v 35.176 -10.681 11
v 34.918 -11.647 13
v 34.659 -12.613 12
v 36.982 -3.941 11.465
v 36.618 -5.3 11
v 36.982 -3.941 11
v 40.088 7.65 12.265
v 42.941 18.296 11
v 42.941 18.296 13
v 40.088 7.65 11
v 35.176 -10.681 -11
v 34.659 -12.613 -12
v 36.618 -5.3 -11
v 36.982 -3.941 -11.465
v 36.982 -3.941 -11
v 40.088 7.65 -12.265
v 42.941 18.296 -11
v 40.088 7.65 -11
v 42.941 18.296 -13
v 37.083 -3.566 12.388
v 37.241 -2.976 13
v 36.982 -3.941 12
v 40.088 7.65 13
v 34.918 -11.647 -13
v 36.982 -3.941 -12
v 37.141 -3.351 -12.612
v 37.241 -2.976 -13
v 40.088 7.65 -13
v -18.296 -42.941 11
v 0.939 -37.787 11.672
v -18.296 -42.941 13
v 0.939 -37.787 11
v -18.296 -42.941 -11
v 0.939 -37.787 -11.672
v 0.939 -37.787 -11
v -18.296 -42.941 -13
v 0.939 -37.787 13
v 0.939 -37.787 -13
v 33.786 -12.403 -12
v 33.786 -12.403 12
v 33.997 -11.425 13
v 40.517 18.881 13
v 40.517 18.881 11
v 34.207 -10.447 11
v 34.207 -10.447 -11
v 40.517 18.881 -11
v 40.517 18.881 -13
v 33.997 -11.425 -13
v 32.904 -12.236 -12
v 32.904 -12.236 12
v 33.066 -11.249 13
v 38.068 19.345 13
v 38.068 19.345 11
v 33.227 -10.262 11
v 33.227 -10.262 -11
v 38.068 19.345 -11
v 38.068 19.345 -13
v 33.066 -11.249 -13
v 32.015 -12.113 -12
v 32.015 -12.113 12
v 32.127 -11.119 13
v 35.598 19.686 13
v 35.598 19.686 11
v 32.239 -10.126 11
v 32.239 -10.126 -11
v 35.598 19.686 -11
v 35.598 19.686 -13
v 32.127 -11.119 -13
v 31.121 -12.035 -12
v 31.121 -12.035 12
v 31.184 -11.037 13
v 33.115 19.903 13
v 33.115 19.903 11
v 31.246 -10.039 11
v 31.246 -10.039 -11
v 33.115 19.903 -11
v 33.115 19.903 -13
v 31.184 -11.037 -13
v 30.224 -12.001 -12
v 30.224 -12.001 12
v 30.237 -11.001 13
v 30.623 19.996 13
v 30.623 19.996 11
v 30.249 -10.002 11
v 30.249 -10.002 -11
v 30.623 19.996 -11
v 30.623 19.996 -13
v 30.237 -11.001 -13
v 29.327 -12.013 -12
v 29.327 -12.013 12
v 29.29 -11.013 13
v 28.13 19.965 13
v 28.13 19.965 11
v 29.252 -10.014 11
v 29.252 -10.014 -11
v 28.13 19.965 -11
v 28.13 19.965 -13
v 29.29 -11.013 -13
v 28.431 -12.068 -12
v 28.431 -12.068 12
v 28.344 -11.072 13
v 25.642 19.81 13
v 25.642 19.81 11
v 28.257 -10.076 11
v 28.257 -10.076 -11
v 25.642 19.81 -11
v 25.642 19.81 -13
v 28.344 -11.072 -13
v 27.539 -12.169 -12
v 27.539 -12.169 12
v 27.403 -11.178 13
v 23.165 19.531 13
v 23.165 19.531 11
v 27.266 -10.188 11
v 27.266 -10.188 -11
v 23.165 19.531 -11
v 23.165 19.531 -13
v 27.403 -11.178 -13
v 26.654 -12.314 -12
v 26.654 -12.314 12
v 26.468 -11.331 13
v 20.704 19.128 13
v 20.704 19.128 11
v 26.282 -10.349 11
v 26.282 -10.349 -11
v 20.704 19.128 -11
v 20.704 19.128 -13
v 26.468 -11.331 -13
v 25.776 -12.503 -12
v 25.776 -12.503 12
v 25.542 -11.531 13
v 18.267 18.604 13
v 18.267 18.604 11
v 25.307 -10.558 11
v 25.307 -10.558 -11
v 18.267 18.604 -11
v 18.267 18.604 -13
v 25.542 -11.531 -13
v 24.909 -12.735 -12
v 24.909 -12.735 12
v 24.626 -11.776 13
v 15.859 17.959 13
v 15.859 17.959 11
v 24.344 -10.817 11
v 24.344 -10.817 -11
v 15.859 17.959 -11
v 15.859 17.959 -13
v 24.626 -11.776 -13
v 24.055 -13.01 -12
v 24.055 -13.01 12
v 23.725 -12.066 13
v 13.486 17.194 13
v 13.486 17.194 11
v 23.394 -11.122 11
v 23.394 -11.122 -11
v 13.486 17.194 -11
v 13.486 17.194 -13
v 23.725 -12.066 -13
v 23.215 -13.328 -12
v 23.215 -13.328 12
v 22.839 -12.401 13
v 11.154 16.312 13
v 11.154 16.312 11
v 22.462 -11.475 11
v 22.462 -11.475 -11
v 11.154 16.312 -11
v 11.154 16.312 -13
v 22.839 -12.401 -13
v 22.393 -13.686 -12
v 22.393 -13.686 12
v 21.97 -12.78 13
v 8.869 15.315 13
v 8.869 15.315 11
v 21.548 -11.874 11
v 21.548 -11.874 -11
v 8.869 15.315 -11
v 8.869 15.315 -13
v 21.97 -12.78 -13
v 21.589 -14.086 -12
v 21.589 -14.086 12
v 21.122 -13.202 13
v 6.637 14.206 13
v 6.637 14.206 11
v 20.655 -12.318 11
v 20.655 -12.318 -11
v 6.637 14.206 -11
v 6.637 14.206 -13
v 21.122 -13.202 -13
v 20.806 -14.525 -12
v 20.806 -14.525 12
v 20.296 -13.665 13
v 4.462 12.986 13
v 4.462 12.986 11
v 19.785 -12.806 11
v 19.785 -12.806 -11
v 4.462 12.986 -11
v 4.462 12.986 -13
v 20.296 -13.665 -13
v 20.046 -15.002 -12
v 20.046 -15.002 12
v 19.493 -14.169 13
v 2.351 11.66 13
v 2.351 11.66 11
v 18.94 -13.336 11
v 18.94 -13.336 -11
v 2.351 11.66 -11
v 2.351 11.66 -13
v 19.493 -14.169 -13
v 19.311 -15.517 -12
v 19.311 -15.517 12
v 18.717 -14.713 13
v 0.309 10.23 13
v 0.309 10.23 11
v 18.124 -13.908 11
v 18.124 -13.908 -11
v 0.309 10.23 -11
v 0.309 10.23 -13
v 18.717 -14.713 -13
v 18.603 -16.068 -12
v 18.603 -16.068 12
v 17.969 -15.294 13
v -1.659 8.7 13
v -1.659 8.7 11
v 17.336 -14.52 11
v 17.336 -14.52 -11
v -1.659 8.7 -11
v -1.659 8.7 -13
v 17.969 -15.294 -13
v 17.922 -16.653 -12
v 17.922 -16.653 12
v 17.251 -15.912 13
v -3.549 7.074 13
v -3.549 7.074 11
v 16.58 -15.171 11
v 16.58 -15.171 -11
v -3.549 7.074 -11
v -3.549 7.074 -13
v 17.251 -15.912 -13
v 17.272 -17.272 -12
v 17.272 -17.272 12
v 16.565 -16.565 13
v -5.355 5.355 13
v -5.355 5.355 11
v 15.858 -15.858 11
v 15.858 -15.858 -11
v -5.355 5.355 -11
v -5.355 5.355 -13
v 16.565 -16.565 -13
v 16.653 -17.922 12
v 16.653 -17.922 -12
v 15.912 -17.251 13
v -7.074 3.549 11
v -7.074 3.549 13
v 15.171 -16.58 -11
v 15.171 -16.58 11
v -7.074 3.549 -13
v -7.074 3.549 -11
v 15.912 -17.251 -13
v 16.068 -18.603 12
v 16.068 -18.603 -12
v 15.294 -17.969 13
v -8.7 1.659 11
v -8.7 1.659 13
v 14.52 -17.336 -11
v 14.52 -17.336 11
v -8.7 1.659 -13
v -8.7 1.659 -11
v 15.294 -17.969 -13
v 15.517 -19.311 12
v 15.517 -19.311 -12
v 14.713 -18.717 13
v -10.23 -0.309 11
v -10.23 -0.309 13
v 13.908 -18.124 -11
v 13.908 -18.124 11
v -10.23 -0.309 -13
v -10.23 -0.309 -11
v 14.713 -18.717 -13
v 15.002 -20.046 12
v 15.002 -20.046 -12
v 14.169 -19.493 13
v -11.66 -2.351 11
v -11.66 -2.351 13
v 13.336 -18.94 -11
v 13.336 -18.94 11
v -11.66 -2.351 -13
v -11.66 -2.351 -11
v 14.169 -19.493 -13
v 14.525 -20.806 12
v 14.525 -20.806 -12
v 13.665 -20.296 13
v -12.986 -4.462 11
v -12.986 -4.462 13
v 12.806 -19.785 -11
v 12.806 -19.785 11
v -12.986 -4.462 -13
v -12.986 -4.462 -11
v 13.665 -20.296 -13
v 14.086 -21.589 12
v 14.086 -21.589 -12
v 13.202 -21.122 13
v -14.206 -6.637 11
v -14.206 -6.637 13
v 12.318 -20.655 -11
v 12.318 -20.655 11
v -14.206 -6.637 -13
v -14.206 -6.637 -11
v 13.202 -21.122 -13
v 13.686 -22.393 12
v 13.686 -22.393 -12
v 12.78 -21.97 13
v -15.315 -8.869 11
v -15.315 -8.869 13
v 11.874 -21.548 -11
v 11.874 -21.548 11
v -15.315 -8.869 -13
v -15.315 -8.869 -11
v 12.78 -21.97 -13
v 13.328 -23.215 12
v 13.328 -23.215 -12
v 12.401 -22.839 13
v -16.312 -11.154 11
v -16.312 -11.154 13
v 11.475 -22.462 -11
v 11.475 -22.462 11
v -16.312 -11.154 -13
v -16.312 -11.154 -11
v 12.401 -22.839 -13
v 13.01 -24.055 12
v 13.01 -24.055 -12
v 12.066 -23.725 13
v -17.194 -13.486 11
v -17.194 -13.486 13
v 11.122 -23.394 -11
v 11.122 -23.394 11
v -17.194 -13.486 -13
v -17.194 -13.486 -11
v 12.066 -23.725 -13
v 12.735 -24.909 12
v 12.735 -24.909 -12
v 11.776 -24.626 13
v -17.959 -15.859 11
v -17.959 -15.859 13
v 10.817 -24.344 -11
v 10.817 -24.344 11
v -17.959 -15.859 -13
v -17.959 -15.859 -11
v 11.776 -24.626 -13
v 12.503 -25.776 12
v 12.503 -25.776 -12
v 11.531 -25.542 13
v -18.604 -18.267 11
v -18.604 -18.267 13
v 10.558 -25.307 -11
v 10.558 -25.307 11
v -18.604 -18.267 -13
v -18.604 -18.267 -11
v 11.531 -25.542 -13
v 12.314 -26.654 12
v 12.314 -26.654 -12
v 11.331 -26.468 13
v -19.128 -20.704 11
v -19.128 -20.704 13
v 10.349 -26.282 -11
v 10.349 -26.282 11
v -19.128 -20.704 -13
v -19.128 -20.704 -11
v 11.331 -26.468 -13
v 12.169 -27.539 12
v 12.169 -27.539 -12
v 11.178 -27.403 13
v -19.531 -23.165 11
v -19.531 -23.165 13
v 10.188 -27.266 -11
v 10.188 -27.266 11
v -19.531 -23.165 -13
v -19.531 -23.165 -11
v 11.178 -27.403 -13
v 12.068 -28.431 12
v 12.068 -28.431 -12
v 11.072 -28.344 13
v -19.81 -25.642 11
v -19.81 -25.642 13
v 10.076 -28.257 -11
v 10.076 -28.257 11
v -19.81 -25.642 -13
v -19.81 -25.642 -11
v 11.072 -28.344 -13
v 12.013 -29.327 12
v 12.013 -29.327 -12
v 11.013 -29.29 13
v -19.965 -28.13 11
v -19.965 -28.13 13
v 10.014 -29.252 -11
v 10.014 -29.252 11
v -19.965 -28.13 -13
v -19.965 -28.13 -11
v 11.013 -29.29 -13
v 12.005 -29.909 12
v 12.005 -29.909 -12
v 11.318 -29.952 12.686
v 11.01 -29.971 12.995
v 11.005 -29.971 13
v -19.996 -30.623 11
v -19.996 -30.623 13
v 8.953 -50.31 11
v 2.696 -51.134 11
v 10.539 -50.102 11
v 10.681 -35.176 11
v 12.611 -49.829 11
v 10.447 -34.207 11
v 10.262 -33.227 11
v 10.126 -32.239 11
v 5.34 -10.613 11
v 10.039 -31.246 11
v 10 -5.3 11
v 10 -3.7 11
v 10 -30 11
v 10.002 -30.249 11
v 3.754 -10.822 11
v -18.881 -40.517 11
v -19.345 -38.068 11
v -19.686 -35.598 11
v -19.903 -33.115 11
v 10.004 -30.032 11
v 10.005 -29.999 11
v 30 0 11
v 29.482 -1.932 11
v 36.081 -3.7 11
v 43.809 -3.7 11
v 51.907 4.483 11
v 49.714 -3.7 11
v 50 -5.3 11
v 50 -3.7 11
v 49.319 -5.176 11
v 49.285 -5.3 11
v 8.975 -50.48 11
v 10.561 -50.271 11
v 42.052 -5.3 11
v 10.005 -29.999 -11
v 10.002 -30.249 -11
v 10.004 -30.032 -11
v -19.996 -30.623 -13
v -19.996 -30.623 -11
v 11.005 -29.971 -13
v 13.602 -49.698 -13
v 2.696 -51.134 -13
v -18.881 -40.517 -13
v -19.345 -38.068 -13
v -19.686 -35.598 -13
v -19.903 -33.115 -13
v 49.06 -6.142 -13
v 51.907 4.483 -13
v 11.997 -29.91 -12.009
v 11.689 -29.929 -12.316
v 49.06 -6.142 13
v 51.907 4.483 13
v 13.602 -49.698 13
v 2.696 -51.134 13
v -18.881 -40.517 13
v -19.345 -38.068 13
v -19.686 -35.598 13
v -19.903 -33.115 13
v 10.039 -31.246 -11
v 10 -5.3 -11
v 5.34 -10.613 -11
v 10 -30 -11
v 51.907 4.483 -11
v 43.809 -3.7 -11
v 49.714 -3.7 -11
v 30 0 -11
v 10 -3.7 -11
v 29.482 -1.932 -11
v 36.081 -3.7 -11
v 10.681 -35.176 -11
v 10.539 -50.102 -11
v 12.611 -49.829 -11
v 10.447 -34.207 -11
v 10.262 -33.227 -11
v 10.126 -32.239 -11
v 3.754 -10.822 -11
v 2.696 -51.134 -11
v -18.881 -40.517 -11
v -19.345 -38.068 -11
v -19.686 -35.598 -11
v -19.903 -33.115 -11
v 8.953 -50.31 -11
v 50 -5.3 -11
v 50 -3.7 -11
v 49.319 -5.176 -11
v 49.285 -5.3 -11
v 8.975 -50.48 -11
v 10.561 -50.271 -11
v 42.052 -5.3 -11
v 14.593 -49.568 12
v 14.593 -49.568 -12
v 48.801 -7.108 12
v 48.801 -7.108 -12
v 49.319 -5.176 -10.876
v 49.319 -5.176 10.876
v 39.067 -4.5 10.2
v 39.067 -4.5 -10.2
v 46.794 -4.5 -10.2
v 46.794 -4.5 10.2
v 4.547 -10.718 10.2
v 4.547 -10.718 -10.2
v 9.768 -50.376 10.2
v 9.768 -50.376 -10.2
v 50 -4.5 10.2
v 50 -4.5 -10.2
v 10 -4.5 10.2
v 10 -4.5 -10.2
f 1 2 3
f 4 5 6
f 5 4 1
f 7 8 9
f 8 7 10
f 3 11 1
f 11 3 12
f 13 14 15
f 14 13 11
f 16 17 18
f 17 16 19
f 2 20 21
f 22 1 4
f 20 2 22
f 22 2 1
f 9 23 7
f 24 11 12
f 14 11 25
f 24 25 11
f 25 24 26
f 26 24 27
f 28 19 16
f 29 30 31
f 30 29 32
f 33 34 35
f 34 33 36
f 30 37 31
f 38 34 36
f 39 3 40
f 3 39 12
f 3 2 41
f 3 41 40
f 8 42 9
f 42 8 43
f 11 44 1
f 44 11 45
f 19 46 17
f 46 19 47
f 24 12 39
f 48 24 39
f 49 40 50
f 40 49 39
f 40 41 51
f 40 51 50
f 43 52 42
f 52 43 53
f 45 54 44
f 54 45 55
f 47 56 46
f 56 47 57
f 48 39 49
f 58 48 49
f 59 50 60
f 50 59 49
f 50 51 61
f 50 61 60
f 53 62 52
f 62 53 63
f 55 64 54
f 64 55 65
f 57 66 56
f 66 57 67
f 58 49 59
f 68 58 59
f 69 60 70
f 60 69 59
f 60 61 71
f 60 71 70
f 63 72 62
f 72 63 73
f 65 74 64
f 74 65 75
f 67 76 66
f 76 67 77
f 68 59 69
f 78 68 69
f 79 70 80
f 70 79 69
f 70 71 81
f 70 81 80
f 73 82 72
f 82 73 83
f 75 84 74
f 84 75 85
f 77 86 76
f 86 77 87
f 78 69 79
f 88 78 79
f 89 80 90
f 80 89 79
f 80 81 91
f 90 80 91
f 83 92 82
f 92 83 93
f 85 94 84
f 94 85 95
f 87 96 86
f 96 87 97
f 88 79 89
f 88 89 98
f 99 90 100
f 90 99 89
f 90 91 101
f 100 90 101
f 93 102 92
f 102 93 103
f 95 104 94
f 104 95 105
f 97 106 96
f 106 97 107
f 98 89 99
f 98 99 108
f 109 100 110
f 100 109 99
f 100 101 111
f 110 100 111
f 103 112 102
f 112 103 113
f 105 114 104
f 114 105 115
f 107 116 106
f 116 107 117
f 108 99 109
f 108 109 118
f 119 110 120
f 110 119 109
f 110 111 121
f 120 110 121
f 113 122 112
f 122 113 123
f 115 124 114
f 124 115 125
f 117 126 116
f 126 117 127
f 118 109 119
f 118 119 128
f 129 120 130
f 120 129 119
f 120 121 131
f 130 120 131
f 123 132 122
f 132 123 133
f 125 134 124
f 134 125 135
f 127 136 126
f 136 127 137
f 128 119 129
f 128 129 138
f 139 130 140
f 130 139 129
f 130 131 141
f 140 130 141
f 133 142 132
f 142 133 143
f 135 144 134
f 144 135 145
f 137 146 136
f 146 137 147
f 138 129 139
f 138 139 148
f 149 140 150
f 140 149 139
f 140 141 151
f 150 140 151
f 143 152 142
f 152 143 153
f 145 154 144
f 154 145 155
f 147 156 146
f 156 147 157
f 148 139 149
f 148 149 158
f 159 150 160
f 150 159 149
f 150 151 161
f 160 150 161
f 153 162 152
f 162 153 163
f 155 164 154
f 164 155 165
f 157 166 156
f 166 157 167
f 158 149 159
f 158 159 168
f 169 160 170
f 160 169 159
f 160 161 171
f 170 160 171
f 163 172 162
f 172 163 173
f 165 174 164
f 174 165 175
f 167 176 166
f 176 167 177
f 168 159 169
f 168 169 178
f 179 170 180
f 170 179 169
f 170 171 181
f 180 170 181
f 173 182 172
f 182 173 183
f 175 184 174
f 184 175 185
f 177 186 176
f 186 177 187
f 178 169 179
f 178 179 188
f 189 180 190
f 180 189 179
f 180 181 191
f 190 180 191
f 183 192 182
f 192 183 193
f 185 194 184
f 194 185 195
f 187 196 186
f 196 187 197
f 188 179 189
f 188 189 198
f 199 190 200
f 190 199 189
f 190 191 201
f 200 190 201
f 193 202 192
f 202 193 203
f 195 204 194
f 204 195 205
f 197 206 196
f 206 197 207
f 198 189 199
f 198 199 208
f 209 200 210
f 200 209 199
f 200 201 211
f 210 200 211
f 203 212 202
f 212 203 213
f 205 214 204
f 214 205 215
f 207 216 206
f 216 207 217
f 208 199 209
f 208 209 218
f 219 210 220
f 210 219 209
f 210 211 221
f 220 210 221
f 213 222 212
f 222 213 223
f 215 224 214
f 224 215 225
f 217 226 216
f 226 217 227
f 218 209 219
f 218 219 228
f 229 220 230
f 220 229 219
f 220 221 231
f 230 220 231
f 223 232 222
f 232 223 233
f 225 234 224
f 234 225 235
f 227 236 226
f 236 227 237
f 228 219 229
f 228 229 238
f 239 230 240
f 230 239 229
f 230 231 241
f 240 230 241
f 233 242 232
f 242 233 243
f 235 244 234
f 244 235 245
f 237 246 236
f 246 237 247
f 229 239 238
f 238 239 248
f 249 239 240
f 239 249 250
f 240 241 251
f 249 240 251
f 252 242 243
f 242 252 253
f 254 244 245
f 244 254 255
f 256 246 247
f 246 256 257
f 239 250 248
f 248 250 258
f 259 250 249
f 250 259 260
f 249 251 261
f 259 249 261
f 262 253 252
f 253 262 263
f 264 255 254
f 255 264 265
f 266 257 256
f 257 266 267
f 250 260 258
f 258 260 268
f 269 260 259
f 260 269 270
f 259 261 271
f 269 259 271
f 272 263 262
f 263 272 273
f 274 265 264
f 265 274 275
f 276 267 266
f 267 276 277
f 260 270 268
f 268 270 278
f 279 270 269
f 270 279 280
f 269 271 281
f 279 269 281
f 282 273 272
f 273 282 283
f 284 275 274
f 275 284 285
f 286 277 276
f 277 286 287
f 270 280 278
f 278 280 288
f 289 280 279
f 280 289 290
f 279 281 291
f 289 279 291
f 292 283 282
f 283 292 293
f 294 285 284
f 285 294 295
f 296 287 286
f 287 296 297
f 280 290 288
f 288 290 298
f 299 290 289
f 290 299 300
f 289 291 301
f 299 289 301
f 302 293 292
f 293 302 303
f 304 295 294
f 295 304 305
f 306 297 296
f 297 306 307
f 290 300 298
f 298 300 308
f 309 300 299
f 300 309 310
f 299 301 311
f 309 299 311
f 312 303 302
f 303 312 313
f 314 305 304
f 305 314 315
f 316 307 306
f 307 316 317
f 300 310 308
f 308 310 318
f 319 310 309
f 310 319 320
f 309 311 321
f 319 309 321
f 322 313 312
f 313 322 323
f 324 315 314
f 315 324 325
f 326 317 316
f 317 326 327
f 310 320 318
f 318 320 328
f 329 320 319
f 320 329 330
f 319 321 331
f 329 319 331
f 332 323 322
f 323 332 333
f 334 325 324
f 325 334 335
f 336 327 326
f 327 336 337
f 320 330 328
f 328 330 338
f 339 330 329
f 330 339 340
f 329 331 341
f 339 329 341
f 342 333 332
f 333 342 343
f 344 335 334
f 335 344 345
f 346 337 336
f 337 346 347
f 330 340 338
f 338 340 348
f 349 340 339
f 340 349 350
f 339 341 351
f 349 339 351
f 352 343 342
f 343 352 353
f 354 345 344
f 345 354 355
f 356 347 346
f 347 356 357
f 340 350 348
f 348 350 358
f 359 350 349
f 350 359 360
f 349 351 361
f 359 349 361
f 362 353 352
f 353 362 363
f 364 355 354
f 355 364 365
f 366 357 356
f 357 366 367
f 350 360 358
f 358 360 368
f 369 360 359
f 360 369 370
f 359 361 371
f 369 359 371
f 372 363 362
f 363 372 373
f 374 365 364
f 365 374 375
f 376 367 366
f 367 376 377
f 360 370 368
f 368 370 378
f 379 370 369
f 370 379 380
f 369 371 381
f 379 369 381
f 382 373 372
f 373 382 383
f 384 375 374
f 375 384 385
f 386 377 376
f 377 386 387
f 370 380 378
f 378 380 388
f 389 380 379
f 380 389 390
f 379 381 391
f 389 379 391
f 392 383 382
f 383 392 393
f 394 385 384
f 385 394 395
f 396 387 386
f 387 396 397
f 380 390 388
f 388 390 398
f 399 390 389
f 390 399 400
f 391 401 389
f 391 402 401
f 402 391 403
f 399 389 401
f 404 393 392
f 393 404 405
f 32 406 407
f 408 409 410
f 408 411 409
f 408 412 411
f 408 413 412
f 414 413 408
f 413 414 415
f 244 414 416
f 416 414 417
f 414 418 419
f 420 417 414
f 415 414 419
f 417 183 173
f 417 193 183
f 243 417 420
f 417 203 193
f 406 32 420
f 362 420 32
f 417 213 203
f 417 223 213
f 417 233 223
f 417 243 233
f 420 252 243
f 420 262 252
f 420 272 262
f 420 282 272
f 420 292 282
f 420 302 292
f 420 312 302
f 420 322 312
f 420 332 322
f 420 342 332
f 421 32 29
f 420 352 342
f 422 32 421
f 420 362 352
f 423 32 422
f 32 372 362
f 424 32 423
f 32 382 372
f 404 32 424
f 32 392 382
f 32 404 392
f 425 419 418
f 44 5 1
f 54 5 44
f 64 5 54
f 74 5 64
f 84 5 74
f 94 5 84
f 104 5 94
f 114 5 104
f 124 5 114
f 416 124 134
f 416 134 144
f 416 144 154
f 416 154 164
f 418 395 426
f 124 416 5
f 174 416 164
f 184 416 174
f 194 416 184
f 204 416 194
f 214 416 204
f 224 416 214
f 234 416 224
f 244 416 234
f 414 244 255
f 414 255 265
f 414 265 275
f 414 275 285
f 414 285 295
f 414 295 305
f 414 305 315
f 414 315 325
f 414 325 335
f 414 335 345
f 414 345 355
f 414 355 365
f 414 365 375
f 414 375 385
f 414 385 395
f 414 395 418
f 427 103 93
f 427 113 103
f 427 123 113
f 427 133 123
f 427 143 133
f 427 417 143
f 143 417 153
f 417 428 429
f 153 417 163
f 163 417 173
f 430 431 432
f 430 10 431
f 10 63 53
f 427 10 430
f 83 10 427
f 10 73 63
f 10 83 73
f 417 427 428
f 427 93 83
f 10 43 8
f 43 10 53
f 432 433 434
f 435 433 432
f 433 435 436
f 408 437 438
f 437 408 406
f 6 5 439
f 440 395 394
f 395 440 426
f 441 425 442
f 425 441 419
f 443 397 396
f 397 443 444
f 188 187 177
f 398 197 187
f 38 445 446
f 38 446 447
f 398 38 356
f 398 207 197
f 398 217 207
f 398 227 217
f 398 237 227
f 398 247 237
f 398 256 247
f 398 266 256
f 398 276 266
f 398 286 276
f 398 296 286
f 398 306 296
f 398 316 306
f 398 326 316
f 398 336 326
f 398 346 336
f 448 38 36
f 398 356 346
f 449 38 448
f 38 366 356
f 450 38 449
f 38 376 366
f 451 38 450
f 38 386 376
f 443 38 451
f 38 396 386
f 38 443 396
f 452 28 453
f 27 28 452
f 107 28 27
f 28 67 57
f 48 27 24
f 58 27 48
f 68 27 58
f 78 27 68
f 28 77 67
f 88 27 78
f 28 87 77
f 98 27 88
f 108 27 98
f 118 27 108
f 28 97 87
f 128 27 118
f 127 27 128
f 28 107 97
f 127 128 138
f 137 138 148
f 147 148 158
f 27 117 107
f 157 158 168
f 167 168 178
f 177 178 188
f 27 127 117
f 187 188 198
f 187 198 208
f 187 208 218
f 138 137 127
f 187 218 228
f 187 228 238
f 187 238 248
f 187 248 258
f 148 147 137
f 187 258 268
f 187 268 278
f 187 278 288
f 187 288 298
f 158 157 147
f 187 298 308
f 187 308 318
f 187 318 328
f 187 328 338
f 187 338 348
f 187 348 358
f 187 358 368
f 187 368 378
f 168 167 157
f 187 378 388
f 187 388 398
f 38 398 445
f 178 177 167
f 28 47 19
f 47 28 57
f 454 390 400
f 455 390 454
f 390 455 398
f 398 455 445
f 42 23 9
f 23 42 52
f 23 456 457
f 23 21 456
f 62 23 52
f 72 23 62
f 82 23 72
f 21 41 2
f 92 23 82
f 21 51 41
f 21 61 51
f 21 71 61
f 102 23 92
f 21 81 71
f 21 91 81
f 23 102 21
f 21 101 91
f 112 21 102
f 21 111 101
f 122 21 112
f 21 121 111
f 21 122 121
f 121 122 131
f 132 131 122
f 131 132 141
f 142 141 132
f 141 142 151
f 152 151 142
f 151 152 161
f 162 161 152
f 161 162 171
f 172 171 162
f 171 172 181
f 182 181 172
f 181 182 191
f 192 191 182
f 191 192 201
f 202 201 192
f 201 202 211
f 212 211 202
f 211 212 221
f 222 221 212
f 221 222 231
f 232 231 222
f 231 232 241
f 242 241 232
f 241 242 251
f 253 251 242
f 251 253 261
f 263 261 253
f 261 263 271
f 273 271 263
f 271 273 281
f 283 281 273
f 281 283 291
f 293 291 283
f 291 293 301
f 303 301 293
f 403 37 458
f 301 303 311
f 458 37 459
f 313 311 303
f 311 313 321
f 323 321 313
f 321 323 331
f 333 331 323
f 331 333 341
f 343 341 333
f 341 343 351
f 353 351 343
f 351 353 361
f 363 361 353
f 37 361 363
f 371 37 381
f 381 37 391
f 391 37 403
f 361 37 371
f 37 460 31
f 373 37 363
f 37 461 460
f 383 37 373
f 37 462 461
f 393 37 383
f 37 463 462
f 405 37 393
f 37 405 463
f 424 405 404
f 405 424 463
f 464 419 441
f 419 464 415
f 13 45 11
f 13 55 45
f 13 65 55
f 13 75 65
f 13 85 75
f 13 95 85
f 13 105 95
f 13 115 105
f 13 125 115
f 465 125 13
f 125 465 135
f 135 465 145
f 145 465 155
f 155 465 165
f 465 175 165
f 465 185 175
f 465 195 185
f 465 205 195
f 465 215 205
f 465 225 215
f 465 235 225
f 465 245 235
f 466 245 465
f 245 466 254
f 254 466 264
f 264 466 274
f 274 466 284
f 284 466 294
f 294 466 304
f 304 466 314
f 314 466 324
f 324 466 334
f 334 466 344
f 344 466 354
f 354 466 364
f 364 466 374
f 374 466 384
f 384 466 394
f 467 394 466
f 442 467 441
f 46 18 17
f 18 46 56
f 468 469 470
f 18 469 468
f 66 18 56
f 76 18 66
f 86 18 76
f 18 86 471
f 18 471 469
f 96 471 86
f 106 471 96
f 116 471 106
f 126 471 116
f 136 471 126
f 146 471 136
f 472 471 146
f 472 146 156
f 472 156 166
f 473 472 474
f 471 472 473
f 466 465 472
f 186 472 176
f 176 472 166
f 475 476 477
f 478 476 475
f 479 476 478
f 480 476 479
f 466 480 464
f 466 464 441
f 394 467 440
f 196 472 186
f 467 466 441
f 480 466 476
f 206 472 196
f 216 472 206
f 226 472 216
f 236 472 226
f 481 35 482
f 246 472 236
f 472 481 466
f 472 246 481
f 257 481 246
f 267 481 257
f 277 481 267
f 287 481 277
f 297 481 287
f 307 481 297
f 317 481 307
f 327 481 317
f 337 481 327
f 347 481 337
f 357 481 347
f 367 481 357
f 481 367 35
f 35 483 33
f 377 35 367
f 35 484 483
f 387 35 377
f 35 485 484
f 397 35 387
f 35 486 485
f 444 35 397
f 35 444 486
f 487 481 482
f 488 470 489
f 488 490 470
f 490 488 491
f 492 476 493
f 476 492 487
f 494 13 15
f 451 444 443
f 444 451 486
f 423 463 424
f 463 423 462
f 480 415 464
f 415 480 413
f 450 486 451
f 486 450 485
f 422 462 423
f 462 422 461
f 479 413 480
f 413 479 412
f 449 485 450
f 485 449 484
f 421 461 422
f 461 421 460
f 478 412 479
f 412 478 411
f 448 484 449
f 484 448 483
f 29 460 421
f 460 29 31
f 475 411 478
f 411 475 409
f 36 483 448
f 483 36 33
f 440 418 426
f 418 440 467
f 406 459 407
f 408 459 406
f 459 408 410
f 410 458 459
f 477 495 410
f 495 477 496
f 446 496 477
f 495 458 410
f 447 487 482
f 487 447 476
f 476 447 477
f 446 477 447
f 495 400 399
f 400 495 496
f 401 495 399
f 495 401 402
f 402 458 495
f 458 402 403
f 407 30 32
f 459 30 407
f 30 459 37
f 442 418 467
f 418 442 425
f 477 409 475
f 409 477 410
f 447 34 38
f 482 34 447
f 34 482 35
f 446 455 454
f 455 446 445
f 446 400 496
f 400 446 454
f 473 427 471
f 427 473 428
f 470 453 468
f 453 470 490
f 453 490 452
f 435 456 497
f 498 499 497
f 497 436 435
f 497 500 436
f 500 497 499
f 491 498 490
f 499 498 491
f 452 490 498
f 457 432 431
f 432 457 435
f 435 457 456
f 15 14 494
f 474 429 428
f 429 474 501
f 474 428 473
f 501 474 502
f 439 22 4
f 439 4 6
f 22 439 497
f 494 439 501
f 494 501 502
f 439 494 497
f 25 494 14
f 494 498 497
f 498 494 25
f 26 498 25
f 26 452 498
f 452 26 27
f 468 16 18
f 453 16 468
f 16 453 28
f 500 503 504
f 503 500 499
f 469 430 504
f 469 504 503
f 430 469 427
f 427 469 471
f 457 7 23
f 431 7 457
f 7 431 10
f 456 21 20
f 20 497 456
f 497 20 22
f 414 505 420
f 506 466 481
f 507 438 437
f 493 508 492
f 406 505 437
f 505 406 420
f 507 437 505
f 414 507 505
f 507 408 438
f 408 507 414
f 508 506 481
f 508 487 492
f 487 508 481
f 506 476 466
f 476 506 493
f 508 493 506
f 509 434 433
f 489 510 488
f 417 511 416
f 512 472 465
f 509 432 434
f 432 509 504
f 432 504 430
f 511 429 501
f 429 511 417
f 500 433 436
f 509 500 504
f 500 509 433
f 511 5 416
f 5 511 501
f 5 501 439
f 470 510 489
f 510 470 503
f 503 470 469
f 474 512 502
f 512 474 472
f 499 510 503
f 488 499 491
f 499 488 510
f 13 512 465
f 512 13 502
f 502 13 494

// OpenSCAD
//###############################################################################
//# CableChannelParts                                                           #
//###############################################################################
//#    Copyright 2024 Dirk Heisswolf                                            #
//#    This file is part of the CableChannelParts project.                      #
//#                                                                             #
//#    This project is free software: you can redistribute it and/or modify     #
//#    it under the terms of the GNU General Public License as published by     #
//#    the Free Software Foundation, either version 3 of the License, or        #
//#    (at your option) any later version.                                      #
//#                                                                             #
//#    This project is distributed in the hope that it will be useful,          #
//#    but WITHOUT ANY WARRANTY; without even the implied warranty of           #
//#    MERCHANTABILITY or FITNESS FOR A PARTICULAR PURPOSE.  See the            #
//#    GNU General Public License for more details.                             #
//#                                                                             #
//#    You should have received a copy of the GNU General Public License        #
//#    along with this project.  If not, see <http://www.gnu.org/licenses/>.    #
//#                                                                             #
//###############################################################################
//# Description:                                                                #
//#   Cable channel corners parts                                               #
//#                                                                             #
//###############################################################################
//# Version History:                                                            #
//#   January 15, 2025                                                          #
//#      - Initial release                                                      #
//#                                                                             #
//###############################################################################

channelW = 22;   //width of the cable channel
channelD = 10;   //depth of the cable channel
coverD   =  5.5; //depth of the cable channel cover
innerR   = 20;   //inner radius
outerR   =  5;   //outer radius
cornerT  =  2;   //thickness of the corner pieces
cornerG  =  0.8; //grip  of the corner pieces
cornerO  = 20;   //overlap of corner pieces
$fn = 128;

module outerCorner() {
  //Wall
  color("SlateGray",0.5) {
    translate([-60,0,-20]) cube([60,60,40]);  
  }
  //Channel
  color("Ivory",0.5) {  
    translate([0,5,-channelW/2]) cube([channelD,55,channelW]);  
    translate([-60,-channelD,-channelW/2]) cube([55,channelD,channelW]);  
  } 
}
*outerCorner();

module innerCorner() {
  //Wall
  color("SlateGray",0.5) {
    translate([-60,0,-20]) cube([130,60,40]);  
    translate([-60,-70,-20]) cube([60,70,40]);  
  }
  //Channel
  color("Ivory",0.5) {  
    translate([0,-70,-channelW/2]) cube([channelD,55,channelW]);  
    translate([15,-channelD,-channelW/2]) cube([55,channelD,channelW]);  
  } 
}
*innerCorner();

module cornerProfile(depth=channelD) {
  polygon([[0,          channelW/2],
           [0,         -channelW/2],
           [-depth,    -channelW/2],
           [-depth,    -channelW/2-cornerT],
           [cornerT-1, -channelW/2-cornerT],
           [cornerT,   -channelW/2-cornerT+1],
           [cornerT,    channelW/2+cornerT-1],
           [cornerT-1,  channelW/2+cornerT],
           [-depth,     channelW/2+cornerT],
           [-depth,     channelW/2]]);    
}
*cornerProfile();

module gripProfile() {
  for(m=[0,1]) {
    mirror([0,m,0])
    polygon([[-coverD+cornerG, channelW/2],
             [-coverD-cornerG, channelW/2],
             [-coverD,         channelW/2-cornerG]]);
  }
}
*gripProfile();

module outerCover() {
  difference() {
    union() {
   
      translate([channelD-outerR,-channelD+outerR,0])
      rotate([0,0,270])
      rotate_extrude(angle=90) 
        translate([outerR,0,0]) cornerProfile(outerR);
   
       translate([channelD,cornerO,0])    
       rotate([90,0,0])
       linear_extrude(cornerO+channelD-outerR) 
         cornerProfile();
   
       translate([channelD-outerR,-channelD,0])    
       rotate([90,0,270])
       linear_extrude(cornerO+channelD-outerR) 
         cornerProfile();

       translate([channelD,cornerO,0])    
       rotate([90,0,0])
       linear_extrude(cornerO) 
         gripProfile();
   
       translate([0,-channelD,0])    
       rotate([90,0,270])
       linear_extrude(cornerO) 
         gripProfile();
    }
    union() {
      translate([-60,0,-20]) cube([60,60,40]);  
    }
  }
}
*outerCover();

module innerCover(angle=120) {
  difference() {
    union() {
      #translate([innerR+channelD,-innerR-channelD,0])
      rotate([0,0,270-(angle-90)/2])
      rotate_extrude(angle=angle) 
        translate([-innerR,0,0]) cornerProfile(30);
    
       translate([channelD,-innerR-cornerO/2,0])    
       rotate([90,0,(angle-90)/4])
       linear_extrude(cornerO) 
         cornerProfile();
      
//       translate([cornerO+channelD+innerR,-channelD,0])    
       translate([innerR+channelD,0,0])    
       rotate([270,0,270-(angle-90)/2])
       linear_extrude(cornerO) 
         cornerProfile();
      
       translate([channelD,-cornerO/2,0])    
       rotate([90,0,(angle-90)/4])
       linear_extrude(cornerO+innerR) 
         gripProfile();
      
       translate([cornerO+channelD+innerR,-channelD,0])    
       rotate([90,0,270])
       linear_extrude(cornerO+innerR) 
         gripProfile();
    }
    union() {
      *translate([-60,0,-20]) cube([130,60,40]);  
      *translate([-60,-70,-20]) cube([60,70,40]);    
    }
  }
}
innerCover();

module endCover() {

//       translate([cornerO+channelD+innerR,-channelD,0])    
//       rotate([90,0,270])
         linear_extrude(height=4,scale=[1,1.2]) 
         translate([channelD,0,0])
         cornerProfile();

         translate([0,0,-cornerO])
         linear_extrude(cornerO) 
         translate([channelD,0,0])
         cornerProfile();

         translate([0,0,-cornerO])
         linear_extrude(cornerO) 
         translate([channelD,0,0])
         gripProfile();



}
*endCover();
